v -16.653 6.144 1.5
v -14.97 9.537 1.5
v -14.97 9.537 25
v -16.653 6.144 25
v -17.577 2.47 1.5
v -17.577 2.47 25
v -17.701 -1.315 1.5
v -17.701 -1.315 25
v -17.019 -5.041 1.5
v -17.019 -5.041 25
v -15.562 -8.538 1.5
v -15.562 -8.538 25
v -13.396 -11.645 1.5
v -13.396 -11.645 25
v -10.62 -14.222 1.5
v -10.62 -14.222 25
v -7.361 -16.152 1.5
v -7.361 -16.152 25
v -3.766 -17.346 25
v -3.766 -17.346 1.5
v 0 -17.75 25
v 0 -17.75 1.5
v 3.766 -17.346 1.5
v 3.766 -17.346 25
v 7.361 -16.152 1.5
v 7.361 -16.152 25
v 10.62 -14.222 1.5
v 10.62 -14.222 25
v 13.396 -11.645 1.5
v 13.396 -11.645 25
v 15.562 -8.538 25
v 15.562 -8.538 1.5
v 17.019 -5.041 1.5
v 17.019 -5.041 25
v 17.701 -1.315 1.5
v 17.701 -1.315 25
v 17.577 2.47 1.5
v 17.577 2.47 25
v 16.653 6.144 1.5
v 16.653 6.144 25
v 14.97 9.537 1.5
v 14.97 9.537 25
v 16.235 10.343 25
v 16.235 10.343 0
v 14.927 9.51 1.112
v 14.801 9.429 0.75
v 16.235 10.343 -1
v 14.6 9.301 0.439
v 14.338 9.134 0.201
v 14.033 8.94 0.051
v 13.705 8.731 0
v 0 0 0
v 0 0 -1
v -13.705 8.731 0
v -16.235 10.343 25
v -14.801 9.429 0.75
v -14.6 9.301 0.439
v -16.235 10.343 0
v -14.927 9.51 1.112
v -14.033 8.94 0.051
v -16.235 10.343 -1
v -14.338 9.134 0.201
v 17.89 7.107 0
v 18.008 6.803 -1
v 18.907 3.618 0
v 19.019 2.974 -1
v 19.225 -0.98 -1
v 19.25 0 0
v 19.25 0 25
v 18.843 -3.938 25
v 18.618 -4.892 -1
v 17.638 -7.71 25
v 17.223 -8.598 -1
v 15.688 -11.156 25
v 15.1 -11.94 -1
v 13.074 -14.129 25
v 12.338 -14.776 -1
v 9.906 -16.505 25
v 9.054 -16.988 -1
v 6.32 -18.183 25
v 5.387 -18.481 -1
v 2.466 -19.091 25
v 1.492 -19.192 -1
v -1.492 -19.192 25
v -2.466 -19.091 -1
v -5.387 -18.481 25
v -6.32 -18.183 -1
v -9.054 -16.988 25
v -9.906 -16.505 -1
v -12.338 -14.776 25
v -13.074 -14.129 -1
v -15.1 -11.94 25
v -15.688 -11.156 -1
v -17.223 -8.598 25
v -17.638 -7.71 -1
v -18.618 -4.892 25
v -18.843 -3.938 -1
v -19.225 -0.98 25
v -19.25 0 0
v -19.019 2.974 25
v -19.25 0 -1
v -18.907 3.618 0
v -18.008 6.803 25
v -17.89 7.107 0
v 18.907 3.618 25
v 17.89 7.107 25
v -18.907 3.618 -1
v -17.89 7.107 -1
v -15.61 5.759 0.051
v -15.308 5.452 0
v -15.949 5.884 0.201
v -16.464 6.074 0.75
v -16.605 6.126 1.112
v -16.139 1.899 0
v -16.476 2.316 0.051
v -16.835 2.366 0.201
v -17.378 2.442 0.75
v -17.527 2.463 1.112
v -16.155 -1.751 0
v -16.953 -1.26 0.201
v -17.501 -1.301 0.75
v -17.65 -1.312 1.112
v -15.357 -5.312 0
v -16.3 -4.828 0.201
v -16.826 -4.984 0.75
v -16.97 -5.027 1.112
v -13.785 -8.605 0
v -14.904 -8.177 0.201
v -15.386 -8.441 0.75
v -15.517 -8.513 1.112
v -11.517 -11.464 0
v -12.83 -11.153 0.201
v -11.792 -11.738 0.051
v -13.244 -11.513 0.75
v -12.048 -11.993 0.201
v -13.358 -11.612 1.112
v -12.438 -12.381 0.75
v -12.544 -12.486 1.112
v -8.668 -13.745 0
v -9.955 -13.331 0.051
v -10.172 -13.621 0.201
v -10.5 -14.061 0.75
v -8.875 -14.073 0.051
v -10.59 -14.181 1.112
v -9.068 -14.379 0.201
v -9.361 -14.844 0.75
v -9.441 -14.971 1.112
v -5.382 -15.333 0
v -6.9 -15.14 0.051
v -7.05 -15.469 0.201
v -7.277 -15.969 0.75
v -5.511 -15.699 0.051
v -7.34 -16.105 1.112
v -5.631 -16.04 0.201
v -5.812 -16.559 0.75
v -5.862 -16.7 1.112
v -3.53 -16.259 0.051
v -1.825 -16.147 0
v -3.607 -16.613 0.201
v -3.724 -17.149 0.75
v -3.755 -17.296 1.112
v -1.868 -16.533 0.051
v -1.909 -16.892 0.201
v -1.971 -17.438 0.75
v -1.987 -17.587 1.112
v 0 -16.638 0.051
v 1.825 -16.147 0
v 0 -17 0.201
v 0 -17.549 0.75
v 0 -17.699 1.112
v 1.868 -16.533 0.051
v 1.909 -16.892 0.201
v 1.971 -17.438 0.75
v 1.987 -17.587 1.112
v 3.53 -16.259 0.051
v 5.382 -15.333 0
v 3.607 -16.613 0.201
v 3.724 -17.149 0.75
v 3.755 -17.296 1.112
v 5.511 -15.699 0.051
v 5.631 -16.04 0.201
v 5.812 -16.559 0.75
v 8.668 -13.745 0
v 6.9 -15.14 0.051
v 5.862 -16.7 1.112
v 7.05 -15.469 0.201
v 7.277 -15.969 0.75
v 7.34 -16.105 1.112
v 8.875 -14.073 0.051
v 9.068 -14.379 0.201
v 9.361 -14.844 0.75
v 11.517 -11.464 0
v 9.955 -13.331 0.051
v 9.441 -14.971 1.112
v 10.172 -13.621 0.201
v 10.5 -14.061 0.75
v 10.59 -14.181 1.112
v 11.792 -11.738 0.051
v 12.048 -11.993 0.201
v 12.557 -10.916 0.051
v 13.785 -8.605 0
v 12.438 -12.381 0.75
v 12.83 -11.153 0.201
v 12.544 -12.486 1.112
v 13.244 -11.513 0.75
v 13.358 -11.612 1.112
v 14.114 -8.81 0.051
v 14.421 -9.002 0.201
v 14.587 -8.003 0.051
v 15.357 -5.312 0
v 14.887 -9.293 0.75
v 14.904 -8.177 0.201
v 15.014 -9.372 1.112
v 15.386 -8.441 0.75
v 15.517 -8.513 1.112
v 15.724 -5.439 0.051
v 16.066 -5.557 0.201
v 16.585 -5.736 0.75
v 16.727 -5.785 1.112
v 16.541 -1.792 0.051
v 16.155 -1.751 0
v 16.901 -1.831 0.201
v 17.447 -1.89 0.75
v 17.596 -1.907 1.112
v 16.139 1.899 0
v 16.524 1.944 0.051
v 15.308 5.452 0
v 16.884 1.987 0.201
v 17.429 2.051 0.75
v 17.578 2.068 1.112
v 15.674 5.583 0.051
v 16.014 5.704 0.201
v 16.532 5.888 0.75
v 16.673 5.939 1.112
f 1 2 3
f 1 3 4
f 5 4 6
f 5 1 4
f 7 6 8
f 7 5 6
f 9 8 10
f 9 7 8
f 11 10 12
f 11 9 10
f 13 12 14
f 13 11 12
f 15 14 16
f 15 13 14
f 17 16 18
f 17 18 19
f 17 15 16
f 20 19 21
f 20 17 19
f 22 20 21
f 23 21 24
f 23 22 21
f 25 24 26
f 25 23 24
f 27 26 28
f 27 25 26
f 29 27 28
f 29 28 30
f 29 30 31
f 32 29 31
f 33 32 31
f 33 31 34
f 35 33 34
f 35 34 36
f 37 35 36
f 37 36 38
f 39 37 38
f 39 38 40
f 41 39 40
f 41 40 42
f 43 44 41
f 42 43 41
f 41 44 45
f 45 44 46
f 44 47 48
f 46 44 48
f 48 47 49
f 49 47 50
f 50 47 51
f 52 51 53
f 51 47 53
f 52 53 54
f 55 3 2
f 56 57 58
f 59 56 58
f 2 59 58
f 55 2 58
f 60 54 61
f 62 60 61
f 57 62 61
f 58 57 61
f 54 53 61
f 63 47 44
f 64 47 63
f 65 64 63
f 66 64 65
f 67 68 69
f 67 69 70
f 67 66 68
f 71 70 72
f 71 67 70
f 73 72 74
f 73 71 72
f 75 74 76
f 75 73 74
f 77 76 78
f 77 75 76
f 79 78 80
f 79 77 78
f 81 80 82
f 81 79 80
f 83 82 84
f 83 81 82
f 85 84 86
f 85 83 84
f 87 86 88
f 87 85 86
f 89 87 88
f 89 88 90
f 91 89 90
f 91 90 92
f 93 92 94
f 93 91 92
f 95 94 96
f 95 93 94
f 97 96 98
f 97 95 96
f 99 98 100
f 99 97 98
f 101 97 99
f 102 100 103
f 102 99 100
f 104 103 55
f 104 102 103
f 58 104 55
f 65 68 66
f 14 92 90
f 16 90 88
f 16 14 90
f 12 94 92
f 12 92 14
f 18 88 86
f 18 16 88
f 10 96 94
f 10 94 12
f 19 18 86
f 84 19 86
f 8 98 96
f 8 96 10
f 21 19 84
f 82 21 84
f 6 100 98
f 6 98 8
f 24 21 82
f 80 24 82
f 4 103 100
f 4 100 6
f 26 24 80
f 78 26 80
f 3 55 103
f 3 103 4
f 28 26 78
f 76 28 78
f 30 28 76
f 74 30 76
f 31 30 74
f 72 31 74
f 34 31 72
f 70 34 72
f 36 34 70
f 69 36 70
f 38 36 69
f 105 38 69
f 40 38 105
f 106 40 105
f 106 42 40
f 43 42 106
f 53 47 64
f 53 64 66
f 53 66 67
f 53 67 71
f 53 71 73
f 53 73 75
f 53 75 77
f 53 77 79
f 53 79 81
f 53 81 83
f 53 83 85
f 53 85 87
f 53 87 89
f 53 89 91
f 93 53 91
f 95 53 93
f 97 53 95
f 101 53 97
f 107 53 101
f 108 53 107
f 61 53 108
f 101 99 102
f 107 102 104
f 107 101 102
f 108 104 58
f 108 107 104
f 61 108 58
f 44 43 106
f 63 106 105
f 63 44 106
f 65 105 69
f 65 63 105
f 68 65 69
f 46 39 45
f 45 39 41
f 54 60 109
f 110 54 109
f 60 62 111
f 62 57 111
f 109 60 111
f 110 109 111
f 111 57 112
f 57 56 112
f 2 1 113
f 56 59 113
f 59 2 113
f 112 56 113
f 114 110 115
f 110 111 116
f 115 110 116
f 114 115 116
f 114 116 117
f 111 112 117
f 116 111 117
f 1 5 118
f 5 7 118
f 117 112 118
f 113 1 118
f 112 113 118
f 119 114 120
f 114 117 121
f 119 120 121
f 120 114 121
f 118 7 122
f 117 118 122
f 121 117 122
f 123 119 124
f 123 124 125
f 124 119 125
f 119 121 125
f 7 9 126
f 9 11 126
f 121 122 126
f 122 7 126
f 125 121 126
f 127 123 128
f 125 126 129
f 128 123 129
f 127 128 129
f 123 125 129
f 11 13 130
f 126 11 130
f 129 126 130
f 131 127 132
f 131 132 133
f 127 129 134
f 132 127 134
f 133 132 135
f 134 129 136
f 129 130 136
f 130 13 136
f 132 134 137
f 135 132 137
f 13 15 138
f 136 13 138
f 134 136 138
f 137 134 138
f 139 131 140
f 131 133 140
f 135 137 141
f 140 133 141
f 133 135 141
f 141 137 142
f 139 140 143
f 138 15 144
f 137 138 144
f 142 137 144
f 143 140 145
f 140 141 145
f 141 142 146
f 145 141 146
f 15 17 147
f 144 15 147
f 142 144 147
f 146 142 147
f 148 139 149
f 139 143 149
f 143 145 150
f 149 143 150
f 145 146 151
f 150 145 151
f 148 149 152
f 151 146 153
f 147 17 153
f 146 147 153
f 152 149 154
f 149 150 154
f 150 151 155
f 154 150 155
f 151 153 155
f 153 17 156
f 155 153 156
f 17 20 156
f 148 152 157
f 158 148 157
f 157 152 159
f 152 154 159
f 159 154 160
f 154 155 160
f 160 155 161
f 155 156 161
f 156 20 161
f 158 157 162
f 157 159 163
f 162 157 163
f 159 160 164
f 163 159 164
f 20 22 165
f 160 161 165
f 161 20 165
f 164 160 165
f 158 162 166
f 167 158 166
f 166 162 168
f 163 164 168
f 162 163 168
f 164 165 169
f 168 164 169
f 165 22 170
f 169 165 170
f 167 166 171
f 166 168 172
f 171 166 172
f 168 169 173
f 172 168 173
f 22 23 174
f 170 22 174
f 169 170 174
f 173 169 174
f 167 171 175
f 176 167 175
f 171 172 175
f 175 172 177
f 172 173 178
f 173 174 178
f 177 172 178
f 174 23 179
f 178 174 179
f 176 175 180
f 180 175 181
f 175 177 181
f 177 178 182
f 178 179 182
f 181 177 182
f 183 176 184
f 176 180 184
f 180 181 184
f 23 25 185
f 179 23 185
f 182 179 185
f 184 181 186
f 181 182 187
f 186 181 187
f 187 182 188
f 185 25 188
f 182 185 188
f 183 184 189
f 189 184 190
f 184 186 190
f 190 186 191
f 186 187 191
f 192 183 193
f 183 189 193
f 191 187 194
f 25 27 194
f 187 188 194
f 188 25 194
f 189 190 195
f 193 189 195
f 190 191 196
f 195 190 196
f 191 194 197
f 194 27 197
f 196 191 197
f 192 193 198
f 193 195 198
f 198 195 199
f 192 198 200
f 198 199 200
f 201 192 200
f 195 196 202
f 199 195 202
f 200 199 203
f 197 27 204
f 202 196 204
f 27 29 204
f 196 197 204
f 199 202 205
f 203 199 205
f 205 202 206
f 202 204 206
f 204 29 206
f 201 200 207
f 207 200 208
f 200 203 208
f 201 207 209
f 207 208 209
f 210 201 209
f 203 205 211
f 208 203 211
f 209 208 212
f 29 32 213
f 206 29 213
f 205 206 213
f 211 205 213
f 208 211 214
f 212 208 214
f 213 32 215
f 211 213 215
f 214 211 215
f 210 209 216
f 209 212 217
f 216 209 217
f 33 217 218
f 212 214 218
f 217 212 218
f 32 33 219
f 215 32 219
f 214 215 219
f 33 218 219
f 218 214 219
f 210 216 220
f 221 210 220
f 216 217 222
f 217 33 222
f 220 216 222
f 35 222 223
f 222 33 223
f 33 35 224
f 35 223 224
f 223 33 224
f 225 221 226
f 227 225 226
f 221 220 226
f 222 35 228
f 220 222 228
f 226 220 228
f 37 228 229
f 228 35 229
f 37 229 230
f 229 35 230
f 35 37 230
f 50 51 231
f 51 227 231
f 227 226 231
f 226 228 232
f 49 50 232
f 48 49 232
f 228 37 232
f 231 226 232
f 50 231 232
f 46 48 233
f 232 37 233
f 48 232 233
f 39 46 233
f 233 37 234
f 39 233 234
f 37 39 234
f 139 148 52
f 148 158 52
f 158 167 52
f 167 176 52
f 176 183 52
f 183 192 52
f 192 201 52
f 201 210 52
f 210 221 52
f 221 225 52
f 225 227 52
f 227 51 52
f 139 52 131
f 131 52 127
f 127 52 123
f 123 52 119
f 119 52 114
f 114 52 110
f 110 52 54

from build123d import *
from build123d.topology import SkipClean

# Parameters (mm, degrees)
SKETCH1_R           = 19.25
SKETCH1_R_2         = 17.75
BOSS_EXTRUDE1_DEPTH = 25
BOSS_EXTRUDE2_START = 1
SKETCH2_R           = 19.25
BOSS_EXTRUDE2_DEPTH = 1
CUT_EXTRUDE1_DEPTH  = 38.644720745
FILLET2_R           = 1.5


with BuildPart() as part:
    # Sketch1 → Boss-Extrude1 (new body)
    with BuildSketch(Plane.XY):
        Circle(SKETCH1_R)
        Circle(SKETCH1_R_2, mode=Mode.SUBTRACT)
    extrude(amount=BOSS_EXTRUDE1_DEPTH)

    # Sketch2 → Boss-Extrude2 (add)
    with BuildSketch(Plane(origin=(0, 0, 0), x_dir=(-1, 0, 0), z_dir=(0, 0, -1)).offset(BOSS_EXTRUDE2_START)):
        Circle(SKETCH2_R)
    extrude(amount=-BOSS_EXTRUDE2_DEPTH)

    # Sketch3 → Cut-Extrude1 (cut, through all)
    with SkipClean():  # the faces are left unmerged after this step: merging them gives an invalid solid
        with BuildSketch(Plane(origin=(0, 0, -1), x_dir=(-1, 0, 0), z_dir=(0, 0, -1))):
            with BuildLine():
                Line((-16.235285332, 10.343017461), (0, 0))
                Line((0, 0), (16.235285332, 10.343017461))
                ThreePointArc((16.235285332, 10.343017461), (0, 19.25), (-16.235285332, 10.343017461))
            make_face()
        extrude(amount=-CUT_EXTRUDE1_DEPTH, mode=Mode.SUBTRACT)

    # Fillet2
    fillet2_edges = [part.edges().sort_by_distance(p)[0] for p in [
        (-4.966964999, -17.040884915, 0),
    ]]
    fillet(fillet2_edges, radius=FILLET2_R)


solid = part.part
